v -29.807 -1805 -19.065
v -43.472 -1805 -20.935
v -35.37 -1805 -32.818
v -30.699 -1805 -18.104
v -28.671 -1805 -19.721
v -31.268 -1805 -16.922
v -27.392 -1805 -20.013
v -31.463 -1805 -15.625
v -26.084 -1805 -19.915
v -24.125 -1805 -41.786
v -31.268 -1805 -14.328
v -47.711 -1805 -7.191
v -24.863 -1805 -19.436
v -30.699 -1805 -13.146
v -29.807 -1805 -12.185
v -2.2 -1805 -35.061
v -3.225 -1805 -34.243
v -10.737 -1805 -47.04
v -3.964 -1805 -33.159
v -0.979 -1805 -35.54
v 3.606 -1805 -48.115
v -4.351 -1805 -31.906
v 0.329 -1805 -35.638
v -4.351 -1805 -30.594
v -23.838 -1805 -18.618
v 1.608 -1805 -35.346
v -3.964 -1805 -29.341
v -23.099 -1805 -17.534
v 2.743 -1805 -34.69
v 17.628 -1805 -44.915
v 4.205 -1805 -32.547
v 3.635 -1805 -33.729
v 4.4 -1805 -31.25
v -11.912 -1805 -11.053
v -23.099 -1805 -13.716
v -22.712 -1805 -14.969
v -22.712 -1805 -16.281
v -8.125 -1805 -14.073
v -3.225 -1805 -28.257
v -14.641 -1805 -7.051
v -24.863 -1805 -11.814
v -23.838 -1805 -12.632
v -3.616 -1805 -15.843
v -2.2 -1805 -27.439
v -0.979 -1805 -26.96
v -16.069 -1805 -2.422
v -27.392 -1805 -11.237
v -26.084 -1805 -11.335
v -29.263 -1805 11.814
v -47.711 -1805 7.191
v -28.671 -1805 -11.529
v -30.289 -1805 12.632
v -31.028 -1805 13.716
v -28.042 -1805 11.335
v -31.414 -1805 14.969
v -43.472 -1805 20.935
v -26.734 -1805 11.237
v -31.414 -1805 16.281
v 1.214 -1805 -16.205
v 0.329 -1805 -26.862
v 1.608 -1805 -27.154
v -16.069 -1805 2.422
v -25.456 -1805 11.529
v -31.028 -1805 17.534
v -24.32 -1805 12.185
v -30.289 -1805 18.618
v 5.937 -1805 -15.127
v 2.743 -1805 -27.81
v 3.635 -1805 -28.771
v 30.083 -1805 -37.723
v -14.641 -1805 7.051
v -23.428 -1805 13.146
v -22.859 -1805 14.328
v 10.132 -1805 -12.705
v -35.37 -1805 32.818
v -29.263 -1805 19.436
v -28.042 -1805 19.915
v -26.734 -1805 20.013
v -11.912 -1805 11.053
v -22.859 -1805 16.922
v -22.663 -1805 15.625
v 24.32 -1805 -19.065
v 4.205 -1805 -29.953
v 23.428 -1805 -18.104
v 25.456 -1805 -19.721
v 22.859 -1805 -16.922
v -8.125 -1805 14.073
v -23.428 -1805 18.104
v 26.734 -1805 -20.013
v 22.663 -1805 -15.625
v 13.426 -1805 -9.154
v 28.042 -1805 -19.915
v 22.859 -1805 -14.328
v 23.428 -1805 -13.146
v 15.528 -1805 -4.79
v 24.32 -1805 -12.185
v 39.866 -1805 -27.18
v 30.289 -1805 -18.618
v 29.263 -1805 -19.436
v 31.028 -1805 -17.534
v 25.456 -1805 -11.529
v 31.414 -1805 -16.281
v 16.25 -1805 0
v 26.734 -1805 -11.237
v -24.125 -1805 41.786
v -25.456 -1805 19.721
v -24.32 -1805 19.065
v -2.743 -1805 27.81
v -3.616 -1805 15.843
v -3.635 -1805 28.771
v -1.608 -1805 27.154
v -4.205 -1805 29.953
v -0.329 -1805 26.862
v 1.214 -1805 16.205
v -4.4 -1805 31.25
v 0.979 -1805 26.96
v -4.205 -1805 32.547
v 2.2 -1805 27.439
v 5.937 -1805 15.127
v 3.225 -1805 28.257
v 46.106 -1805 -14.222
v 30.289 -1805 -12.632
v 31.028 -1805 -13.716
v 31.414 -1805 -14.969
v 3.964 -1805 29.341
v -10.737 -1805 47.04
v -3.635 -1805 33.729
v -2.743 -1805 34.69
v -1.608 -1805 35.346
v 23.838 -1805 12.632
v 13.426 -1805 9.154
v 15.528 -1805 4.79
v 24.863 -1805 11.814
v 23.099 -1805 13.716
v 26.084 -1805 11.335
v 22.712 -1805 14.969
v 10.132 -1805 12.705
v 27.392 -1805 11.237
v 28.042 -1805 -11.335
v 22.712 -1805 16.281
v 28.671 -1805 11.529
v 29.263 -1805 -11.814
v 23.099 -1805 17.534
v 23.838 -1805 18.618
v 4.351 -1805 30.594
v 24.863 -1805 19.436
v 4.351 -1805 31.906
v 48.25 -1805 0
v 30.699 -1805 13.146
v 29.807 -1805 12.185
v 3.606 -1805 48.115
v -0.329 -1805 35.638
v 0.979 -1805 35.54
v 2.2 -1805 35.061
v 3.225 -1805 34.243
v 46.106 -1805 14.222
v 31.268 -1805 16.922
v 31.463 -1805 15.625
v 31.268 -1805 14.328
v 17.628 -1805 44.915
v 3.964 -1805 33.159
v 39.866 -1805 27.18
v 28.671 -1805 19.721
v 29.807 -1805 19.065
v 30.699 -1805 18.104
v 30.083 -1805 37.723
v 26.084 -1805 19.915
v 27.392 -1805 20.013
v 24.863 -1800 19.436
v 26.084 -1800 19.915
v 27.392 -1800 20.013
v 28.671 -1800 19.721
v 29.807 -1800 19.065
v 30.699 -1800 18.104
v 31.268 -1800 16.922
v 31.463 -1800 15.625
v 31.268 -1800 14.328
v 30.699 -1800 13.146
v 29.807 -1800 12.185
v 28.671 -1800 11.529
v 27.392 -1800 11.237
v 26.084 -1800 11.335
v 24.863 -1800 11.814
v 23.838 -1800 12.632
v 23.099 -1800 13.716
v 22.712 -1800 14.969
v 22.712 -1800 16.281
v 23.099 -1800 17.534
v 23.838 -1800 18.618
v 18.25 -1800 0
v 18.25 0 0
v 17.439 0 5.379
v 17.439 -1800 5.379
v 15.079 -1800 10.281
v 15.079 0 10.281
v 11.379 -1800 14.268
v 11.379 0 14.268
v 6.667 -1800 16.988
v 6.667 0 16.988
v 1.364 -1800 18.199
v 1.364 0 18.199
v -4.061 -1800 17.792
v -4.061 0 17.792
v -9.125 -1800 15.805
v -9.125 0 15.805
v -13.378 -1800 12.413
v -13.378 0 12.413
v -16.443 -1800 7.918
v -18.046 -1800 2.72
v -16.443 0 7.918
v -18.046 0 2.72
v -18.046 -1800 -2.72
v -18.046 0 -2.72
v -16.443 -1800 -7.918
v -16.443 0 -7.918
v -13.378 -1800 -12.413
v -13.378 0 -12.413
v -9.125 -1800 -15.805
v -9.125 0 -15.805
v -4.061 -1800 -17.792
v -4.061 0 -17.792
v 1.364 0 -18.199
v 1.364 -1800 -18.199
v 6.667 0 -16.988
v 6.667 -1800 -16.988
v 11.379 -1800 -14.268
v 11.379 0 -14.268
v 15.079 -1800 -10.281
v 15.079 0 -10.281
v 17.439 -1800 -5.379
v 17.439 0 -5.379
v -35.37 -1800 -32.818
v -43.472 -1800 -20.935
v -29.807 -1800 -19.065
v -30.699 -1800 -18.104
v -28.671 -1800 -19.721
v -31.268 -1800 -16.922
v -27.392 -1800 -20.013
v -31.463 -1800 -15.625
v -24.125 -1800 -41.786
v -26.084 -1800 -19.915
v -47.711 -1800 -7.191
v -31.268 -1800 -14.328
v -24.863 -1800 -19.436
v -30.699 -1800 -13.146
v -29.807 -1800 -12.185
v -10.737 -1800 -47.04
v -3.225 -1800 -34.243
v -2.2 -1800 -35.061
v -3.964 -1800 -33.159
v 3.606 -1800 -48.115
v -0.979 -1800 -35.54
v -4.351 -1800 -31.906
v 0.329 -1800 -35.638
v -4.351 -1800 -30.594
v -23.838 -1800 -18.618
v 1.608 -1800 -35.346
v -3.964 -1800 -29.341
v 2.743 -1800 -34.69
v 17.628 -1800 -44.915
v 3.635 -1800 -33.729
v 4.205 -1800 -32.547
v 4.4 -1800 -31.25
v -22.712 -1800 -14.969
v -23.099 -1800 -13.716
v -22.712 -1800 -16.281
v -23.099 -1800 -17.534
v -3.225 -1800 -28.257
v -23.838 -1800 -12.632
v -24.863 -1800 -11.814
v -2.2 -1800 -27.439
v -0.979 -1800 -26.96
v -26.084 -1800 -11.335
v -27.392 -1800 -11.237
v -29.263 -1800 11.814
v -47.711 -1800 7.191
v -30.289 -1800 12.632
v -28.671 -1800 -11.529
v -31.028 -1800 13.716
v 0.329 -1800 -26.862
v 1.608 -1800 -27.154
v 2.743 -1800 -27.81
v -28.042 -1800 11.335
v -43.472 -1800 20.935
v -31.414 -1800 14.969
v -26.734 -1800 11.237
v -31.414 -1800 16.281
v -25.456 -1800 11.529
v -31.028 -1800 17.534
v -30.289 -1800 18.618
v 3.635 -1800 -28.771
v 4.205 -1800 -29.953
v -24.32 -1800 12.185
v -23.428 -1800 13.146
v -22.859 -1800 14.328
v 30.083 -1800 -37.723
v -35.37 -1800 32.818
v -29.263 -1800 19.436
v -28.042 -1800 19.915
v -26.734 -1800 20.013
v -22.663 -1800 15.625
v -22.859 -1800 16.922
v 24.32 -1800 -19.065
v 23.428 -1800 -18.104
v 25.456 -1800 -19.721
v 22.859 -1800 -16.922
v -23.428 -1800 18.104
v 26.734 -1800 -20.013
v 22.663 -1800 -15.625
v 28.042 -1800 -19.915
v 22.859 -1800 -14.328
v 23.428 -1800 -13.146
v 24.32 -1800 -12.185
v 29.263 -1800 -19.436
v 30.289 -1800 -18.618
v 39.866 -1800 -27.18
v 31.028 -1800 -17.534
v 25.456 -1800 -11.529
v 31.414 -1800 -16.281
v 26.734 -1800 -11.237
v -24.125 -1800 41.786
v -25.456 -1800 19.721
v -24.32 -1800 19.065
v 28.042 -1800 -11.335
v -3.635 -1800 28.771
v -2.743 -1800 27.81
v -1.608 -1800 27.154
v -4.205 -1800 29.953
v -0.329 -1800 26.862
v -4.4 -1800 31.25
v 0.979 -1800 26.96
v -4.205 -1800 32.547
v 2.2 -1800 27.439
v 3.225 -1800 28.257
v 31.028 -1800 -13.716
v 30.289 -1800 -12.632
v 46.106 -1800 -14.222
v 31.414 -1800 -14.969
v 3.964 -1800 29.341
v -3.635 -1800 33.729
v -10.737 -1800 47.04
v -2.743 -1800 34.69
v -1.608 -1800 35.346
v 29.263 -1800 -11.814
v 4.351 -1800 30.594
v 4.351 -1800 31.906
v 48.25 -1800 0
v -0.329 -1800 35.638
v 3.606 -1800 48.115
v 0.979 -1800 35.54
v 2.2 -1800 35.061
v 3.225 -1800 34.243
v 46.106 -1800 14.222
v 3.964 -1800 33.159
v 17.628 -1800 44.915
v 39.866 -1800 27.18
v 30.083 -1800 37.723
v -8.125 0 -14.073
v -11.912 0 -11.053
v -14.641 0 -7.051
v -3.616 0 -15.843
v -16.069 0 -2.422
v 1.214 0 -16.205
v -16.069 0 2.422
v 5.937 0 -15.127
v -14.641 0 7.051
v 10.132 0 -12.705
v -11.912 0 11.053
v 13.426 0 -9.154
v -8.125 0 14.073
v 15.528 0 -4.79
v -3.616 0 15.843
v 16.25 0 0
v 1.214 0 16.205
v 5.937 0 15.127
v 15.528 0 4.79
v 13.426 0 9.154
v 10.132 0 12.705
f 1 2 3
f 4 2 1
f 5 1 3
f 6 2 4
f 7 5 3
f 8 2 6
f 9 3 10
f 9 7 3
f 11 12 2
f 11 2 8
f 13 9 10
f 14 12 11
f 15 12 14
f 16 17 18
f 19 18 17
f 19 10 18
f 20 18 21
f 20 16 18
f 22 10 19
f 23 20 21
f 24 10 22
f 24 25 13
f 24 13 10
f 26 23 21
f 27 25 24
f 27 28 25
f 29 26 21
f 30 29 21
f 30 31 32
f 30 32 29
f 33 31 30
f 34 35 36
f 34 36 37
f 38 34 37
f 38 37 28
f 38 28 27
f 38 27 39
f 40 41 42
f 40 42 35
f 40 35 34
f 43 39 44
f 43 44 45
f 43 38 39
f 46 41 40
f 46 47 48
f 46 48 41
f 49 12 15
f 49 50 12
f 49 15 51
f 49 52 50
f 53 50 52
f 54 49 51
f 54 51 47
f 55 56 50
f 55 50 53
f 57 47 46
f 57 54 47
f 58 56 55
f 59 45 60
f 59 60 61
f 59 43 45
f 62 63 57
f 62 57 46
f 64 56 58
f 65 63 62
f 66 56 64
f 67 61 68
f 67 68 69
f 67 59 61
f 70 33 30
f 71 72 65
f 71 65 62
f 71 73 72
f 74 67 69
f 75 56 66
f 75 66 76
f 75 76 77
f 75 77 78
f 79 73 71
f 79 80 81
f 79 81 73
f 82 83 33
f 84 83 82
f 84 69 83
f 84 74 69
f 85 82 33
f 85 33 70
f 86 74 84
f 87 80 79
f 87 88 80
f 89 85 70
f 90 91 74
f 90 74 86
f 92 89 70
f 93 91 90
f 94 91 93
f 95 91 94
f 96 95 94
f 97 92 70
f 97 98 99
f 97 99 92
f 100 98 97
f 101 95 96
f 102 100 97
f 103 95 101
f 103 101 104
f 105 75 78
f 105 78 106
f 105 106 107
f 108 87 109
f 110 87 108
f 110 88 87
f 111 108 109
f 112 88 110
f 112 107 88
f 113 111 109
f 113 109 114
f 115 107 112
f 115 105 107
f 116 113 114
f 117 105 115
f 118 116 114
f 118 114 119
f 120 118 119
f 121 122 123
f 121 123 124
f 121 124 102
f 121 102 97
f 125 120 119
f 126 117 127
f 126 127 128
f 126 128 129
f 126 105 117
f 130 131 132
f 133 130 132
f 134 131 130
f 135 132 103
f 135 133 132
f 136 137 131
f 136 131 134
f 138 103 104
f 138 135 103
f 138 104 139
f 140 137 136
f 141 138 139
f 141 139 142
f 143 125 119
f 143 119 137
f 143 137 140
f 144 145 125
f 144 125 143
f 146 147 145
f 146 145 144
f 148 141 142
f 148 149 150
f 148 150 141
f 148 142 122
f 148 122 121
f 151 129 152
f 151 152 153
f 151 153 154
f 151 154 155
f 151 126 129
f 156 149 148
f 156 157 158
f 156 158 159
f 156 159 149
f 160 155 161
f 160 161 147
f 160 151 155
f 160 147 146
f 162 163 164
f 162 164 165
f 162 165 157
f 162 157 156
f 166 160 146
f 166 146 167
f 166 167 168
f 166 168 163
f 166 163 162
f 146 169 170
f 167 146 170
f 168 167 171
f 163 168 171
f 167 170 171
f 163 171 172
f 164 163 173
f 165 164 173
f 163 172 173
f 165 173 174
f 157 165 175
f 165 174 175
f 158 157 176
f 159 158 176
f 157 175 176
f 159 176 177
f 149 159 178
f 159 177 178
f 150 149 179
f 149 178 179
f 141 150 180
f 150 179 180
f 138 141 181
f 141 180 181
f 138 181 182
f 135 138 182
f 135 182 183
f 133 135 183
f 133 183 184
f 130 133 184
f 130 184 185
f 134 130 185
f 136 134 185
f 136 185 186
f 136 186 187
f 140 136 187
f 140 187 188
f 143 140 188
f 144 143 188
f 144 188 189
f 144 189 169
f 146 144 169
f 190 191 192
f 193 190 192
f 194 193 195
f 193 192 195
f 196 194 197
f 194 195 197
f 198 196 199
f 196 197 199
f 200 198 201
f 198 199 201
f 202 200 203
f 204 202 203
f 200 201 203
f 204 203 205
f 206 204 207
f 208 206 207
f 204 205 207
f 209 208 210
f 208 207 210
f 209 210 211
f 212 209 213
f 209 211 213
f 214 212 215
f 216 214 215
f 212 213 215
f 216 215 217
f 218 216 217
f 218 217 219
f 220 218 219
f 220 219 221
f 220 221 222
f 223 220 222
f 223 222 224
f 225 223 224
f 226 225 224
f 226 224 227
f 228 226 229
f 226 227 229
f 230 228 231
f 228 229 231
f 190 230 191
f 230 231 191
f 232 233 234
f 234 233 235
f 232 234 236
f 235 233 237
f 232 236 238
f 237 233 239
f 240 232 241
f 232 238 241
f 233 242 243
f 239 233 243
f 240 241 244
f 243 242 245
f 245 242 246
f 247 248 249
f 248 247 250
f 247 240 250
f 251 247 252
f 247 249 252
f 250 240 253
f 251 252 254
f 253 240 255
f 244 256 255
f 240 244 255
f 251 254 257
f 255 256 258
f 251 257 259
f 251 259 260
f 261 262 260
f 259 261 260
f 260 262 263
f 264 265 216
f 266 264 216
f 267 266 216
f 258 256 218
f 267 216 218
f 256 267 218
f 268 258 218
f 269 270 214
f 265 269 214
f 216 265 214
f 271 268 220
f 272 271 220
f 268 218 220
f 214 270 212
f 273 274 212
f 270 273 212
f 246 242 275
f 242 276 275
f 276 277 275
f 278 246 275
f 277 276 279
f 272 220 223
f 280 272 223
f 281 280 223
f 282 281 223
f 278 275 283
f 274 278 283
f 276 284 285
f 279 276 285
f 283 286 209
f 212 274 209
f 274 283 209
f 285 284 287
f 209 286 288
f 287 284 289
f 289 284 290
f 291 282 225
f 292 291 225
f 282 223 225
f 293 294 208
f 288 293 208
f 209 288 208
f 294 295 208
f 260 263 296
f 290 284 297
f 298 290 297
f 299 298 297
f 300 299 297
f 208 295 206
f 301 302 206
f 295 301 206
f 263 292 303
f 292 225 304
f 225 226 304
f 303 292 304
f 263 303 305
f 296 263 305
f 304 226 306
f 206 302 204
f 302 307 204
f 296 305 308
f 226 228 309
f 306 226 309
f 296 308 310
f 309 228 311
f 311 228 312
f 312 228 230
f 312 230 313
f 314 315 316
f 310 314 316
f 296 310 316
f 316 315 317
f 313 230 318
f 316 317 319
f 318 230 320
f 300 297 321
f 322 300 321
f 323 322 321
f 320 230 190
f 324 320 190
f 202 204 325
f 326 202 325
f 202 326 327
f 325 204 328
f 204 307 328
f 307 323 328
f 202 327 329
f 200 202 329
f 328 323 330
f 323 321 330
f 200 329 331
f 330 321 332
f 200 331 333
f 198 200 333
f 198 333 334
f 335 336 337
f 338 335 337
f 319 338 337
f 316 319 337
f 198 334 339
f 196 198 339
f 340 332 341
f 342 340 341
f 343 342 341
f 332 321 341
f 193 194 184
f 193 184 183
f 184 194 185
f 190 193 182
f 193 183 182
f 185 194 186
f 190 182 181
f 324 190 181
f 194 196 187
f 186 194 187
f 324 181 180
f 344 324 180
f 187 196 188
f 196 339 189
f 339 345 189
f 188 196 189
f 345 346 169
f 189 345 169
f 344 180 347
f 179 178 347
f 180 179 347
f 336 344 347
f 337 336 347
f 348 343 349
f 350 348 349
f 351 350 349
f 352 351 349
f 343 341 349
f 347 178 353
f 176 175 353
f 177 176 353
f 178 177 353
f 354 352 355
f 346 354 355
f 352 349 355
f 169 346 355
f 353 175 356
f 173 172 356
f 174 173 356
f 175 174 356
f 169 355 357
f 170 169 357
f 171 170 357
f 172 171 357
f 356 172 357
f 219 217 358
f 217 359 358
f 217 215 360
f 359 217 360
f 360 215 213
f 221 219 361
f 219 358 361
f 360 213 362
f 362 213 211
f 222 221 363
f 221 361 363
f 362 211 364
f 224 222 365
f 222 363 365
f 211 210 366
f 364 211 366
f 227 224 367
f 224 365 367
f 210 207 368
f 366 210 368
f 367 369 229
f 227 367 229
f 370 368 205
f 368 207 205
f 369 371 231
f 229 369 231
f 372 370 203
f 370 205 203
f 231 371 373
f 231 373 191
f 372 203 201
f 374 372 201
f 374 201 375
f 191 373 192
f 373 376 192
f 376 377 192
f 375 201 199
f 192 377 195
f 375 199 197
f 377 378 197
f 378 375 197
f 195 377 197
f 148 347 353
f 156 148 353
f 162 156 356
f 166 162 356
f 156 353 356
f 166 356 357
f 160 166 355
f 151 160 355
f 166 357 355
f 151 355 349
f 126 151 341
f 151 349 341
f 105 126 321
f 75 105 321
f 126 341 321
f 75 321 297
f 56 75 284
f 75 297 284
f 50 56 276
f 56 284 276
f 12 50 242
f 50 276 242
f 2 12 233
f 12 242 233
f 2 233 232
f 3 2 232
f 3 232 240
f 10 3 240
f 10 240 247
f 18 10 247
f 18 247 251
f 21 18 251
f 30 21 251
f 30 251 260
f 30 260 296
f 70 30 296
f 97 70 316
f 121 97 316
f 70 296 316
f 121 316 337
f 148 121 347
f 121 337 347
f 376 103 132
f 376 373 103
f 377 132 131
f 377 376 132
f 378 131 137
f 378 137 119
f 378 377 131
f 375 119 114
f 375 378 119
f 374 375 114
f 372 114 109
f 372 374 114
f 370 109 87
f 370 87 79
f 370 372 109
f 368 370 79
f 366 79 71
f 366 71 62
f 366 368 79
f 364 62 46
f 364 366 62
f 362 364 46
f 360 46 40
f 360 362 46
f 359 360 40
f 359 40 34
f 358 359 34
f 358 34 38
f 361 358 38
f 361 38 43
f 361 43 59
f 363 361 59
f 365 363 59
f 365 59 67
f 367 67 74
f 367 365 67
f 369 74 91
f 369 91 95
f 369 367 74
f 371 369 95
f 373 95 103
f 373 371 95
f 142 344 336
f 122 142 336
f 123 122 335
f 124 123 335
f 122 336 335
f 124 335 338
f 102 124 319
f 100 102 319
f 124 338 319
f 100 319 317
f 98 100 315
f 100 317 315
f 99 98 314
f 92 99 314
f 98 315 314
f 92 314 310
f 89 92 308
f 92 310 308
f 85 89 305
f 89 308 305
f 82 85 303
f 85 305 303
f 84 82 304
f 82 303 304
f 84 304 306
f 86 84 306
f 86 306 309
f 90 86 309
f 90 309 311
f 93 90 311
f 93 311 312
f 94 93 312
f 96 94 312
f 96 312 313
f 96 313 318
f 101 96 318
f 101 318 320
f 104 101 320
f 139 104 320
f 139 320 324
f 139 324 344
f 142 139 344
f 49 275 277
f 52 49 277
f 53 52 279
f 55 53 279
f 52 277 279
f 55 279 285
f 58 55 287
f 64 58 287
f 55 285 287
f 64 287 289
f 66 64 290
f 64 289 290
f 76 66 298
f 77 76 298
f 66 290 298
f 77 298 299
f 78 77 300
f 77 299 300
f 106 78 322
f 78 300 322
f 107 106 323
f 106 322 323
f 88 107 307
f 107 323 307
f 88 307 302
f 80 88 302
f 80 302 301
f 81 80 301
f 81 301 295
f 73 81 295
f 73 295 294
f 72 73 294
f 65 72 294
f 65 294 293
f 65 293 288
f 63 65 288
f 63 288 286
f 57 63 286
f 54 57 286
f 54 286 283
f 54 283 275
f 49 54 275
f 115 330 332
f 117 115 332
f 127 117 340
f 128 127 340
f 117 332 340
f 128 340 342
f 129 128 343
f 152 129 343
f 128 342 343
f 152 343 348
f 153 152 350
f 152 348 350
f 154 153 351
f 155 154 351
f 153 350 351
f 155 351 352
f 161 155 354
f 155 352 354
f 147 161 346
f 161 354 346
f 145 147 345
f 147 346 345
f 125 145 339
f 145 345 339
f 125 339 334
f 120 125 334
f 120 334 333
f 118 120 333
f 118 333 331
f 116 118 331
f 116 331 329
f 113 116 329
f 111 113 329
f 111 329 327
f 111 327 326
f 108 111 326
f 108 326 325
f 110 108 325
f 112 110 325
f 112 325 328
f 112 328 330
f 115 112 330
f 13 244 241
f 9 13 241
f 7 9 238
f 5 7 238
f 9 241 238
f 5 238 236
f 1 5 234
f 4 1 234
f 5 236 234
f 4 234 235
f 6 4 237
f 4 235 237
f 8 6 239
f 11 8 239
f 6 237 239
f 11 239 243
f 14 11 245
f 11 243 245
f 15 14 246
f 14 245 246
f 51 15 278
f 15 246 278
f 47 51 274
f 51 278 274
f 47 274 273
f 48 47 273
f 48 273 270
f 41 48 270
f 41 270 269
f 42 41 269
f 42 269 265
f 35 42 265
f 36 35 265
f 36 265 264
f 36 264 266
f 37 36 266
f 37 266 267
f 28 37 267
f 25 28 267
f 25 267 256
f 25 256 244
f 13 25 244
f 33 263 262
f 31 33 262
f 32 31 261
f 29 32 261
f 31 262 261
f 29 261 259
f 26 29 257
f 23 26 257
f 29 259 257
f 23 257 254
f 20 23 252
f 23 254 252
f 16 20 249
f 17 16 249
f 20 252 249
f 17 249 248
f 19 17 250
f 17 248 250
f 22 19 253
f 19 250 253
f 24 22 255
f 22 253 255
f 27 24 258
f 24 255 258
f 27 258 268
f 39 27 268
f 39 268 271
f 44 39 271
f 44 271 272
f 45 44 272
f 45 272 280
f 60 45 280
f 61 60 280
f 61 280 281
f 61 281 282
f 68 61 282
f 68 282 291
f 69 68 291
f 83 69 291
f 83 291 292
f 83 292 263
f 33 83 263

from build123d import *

# Parameters (mm, degrees)
F0_R            = 18.25
F0_R_2          = 16.25
F1_DEPTH        = 1800
F2_R            = 48.25
F2_R_2          = 18.25
F2_R_3          = 16.25
F3_DEPTH        = 5
F5_D            = 8.8
F5_COPIES_COUNT = 6


# Not quite as in the source:
# - a pattern or mirror of a feature is missing from the dataset's text; its kind, count and spacing are read off the source's solid


with BuildPart() as f1:
    # F0 (on Front) → F1 (new body)
    with BuildSketch(Plane.XZ):
        Circle(F0_R)
        Circle(F0_R_2, mode=Mode.SUBTRACT)
    extrude(amount=F1_DEPTH)

    # F2 (on face) → F3 (join)
    with BuildSketch(Plane.XZ.offset(1800)):
        Circle(F2_R)
        Circle(F2_R_2, mode=Mode.SUBTRACT)
        Circle(F2_R_2)
        Circle(F2_R_3, mode=Mode.SUBTRACT)
    extrude(amount=F3_DEPTH)

    # F5 (through all)
    with Locations(Plane.XZ.offset(1805)):
        with Locations((0, 31.25)):
            f5 = Hole(F5_D / 2)

    # F5_copies: F5 ×6 about axis
    f5_copies_axis = Axis((0, 0, 0), (0, 1, 0))
    for i in range(1, F5_COPIES_COUNT):
        add(f5.rotate(f5_copies_axis, i * 360 / F5_COPIES_COUNT), mode=Mode.SUBTRACT)


solid = f1.part
